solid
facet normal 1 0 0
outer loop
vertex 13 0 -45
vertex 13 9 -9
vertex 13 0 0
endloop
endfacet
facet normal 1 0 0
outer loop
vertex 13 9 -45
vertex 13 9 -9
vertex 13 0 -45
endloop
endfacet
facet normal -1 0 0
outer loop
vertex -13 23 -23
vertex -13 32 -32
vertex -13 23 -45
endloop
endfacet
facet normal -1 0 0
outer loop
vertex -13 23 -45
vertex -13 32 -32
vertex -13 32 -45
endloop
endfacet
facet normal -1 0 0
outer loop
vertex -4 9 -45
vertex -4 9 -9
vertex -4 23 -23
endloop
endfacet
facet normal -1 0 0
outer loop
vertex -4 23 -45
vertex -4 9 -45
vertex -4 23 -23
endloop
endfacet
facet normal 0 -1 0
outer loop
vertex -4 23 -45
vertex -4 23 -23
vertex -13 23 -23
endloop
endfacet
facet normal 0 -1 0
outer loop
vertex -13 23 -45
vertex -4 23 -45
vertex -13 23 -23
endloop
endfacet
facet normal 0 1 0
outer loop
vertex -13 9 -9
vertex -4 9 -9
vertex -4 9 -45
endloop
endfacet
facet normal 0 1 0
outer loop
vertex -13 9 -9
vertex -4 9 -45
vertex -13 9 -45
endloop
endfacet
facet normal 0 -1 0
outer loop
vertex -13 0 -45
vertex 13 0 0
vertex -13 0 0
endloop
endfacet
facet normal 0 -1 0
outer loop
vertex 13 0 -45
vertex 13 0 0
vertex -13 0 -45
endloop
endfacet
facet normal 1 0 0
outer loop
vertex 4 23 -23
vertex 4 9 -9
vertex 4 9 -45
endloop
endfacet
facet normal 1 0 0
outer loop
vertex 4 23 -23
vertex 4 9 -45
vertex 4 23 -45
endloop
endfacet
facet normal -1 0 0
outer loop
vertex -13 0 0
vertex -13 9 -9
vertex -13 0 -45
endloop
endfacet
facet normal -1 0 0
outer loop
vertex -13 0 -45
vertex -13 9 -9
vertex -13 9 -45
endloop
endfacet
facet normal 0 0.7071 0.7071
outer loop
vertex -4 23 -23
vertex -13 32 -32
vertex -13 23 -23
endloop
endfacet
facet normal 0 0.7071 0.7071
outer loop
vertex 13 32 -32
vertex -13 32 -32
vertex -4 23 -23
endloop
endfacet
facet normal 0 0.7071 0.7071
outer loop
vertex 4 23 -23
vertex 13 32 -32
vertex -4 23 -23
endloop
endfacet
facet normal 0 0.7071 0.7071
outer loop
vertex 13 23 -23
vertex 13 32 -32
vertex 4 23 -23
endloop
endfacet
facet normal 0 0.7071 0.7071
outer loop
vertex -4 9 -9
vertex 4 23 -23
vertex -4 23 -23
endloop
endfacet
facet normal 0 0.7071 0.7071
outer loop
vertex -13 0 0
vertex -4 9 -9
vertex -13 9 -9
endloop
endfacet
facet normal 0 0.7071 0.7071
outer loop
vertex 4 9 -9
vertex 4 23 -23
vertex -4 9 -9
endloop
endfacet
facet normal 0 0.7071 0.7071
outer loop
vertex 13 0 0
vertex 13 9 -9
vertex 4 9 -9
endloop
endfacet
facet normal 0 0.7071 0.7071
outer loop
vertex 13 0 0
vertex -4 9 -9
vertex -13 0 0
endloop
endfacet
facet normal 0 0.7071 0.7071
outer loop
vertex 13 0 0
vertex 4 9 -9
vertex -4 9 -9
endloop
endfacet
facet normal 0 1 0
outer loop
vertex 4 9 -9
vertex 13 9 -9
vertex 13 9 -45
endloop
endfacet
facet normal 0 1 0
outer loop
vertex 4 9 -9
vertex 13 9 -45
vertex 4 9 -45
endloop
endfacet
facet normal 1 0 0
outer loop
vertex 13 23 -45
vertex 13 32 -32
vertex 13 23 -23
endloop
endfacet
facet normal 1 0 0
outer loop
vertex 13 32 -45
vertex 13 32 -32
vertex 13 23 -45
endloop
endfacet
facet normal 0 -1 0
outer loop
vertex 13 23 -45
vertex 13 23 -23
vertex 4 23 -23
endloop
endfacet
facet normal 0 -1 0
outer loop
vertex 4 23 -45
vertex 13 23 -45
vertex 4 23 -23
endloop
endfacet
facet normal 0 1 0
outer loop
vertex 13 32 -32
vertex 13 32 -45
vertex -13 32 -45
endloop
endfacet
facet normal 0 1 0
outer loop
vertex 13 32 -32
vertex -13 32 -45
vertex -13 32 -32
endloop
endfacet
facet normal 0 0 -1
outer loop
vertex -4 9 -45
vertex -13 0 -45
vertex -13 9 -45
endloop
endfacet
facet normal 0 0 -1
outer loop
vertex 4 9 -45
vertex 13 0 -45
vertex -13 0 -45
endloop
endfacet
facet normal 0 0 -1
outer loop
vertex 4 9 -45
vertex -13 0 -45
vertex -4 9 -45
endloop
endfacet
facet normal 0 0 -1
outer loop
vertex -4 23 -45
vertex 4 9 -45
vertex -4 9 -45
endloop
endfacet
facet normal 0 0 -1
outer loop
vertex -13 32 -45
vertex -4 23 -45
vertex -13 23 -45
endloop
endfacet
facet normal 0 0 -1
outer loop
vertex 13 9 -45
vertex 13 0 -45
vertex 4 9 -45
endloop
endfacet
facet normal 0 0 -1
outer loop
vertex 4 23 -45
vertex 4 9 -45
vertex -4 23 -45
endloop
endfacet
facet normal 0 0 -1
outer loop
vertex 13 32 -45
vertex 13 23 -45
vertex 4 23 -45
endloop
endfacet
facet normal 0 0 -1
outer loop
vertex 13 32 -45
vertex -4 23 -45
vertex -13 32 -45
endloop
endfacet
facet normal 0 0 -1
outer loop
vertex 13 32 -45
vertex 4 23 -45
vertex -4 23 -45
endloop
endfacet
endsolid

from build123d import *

# Parameters (mm, degrees)
EXTRUDE_1_DEPTH     = 13
SKETCH_2_W          = 9
SKETCH_2_H          = 14
CUT_EXTRUDE_1_DEPTH = 57.727418415


with BuildPart() as part:
    # 草图1 → 凸台-拉伸1 (new, symmetric)
    with BuildSketch(Plane(origin=(0, 0, 0), x_dir=(0, 0, -1), z_dir=(1, 0, 0))):
        Polygon((0, 0), (45, 0), (45, 32), (32, 32), align=None)
    extrude(amount=EXTRUDE_1_DEPTH, both=True)

    # 草图2 → 切除-拉伸1 (cut, through all)
    with BuildSketch(Plane(origin=(0, 0, -45), x_dir=(-1, 0, 0), z_dir=(0, 0, -1))):
        with Locations((-8.5, 16)):
            Rectangle(SKETCH_2_W, SKETCH_2_H)
        with Locations((8.5, 16)):
            Rectangle(SKETCH_2_W, SKETCH_2_H)
    extrude(amount=-CUT_EXTRUDE_1_DEPTH, mode=Mode.SUBTRACT)


solid = part.part
